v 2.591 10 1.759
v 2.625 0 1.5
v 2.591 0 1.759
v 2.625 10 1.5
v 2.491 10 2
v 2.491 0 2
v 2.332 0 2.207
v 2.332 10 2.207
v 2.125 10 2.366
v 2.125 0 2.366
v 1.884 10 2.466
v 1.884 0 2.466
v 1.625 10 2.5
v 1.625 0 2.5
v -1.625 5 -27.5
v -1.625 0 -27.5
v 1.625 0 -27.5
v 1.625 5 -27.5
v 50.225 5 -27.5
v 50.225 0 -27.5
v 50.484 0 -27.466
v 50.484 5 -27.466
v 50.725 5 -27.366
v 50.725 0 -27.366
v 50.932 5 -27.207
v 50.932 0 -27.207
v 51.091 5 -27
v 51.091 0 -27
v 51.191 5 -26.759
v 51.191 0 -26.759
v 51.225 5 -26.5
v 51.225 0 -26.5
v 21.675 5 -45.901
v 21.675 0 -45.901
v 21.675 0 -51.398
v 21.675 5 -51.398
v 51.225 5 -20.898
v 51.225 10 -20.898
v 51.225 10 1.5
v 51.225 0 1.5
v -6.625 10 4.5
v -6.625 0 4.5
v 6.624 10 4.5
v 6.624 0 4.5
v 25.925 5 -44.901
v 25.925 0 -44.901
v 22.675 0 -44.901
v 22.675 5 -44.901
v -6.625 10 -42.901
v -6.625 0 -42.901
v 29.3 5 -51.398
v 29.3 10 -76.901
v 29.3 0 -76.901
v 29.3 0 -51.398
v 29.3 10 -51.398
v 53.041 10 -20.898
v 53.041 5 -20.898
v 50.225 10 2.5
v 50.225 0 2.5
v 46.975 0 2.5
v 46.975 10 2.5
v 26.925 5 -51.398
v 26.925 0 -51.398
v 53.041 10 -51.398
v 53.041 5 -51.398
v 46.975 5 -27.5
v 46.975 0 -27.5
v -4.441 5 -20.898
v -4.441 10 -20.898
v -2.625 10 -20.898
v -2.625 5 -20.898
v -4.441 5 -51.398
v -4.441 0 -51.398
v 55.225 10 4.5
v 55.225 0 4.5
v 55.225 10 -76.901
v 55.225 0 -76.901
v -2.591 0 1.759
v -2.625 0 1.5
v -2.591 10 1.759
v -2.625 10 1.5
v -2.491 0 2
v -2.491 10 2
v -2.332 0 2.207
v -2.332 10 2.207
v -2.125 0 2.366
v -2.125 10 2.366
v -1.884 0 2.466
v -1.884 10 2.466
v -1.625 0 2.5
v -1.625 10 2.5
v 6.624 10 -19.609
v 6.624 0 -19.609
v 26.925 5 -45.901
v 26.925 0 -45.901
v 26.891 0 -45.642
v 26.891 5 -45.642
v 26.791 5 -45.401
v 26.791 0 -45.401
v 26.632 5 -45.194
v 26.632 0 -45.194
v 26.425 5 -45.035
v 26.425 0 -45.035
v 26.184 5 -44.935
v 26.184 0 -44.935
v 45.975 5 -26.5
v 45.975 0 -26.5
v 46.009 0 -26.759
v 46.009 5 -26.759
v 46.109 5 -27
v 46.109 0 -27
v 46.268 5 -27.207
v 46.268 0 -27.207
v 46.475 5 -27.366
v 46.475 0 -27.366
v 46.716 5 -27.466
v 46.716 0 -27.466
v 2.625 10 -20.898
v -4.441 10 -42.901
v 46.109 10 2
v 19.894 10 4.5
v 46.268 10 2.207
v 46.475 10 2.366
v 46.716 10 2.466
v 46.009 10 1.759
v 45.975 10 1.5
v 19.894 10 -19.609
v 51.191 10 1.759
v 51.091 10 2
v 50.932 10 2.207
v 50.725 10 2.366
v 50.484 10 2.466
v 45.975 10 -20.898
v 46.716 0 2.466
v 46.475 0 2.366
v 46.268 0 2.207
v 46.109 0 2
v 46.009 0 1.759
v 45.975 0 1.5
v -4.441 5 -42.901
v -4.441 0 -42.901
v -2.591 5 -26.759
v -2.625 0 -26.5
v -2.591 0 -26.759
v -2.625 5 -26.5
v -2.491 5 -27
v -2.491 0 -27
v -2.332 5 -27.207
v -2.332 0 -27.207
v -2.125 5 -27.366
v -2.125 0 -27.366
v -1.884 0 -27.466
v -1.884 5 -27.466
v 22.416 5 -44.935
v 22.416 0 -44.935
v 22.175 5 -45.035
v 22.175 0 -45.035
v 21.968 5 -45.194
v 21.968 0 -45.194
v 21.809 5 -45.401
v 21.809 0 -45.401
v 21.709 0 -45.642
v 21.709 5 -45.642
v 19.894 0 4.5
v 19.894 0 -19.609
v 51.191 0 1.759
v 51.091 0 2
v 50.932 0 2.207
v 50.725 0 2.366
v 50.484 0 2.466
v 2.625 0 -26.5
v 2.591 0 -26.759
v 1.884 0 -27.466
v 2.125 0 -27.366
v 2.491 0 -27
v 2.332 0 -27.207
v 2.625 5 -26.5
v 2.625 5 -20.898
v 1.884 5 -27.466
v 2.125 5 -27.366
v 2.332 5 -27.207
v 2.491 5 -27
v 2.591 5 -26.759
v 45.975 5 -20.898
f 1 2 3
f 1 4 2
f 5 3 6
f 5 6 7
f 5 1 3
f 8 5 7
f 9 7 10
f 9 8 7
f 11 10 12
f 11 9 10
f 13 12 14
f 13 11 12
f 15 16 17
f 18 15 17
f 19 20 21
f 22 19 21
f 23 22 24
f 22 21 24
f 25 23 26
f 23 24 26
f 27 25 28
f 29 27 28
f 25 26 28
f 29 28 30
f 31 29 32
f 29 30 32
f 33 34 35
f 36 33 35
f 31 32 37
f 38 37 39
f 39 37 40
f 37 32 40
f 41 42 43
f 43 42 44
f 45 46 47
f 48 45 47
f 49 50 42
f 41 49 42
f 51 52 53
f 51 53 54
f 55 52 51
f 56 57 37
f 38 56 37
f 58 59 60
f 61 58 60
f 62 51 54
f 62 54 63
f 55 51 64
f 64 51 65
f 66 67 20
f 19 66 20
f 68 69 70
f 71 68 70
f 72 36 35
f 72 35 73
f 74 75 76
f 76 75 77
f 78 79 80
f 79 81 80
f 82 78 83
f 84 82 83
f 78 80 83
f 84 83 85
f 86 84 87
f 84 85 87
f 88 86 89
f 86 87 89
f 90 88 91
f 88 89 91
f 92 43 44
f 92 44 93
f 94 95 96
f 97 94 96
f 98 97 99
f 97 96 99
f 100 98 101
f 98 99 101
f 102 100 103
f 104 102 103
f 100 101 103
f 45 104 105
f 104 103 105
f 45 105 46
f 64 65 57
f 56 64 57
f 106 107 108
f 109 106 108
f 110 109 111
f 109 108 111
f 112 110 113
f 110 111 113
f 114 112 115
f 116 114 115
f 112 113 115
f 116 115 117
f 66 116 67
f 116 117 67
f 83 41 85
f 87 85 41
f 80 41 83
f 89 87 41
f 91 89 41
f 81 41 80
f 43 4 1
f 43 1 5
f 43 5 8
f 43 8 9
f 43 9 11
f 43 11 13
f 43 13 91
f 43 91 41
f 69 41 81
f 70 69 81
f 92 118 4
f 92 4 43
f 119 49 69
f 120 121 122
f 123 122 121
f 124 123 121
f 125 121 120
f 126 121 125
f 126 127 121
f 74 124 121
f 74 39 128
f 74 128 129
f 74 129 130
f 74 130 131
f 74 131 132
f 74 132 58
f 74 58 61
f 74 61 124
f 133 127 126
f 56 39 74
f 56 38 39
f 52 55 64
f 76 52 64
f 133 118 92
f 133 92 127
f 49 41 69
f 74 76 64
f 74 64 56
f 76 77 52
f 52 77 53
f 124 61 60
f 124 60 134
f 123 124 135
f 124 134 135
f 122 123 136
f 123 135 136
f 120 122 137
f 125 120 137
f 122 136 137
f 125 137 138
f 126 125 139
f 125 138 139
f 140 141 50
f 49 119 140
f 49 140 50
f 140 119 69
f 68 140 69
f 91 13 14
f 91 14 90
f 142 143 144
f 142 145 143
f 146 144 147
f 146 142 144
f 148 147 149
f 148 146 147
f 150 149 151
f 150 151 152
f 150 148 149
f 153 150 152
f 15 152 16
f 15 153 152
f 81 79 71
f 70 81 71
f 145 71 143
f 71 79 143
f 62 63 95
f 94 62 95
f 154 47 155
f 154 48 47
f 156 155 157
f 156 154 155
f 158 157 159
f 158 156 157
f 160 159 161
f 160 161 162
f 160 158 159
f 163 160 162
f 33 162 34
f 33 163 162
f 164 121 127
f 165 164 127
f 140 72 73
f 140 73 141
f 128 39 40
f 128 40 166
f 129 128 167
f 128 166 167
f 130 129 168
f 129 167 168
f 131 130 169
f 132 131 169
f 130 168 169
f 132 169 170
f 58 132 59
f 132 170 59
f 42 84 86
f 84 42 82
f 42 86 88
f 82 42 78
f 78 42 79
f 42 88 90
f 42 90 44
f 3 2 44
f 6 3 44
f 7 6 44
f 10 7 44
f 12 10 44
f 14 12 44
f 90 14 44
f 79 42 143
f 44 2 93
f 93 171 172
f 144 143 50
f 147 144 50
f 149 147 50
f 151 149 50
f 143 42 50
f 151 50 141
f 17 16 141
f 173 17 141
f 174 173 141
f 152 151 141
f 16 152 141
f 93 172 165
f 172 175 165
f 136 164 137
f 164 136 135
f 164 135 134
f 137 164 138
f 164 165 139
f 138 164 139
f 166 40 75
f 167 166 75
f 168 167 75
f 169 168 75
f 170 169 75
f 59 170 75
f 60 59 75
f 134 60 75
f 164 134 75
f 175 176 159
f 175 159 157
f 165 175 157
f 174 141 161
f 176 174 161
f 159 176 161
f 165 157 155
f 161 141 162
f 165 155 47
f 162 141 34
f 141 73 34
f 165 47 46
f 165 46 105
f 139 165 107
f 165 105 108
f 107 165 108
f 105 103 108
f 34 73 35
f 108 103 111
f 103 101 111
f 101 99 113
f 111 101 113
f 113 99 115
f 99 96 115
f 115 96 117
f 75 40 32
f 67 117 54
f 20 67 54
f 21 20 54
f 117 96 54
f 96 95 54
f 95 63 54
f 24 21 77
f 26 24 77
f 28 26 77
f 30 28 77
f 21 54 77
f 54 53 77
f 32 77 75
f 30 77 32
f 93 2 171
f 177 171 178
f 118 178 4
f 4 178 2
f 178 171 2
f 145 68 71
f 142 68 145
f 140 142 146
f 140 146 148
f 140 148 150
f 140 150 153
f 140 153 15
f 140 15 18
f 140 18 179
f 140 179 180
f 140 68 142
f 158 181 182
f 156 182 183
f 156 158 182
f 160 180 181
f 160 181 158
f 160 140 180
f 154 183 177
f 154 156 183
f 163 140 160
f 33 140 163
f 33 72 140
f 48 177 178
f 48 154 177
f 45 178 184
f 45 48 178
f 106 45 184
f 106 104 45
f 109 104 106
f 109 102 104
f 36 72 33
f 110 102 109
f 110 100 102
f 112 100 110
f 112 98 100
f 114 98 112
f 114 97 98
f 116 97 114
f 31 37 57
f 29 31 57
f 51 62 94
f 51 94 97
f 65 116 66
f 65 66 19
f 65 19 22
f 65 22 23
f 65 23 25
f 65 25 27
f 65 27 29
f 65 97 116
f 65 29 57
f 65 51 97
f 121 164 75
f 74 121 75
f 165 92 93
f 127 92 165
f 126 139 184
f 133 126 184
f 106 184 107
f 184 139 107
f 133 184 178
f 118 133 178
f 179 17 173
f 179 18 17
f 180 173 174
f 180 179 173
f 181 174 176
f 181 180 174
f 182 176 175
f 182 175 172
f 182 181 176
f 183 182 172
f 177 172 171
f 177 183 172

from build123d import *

# Parameters (mm, degrees)
BOSS_EXTRUDE5_DEPTH = 10
CUT_EXTRUDE6_DEPTH  = 5
FILLET4_R           = 1
MIRROR25_DEPTH      = 10
MIRROR25_2_DEPTH    = 5
SKETCH20_W          = 13.27
SKETCH20_H          = 33.288518674
CUT_EXTRUDE7_DEPTH  = 10


# Read off the part's stored shape, not the designer's step: Mirror25
with BuildPart() as part:
    # Sketch15 → Boss-Extrude5 (new body)
    with BuildSketch(Plane(origin=(0, 0, 0), x_dir=(1, 0, 0), z_dir=(0, 1, 0))):
        Polygon((24.3, 76.900659127), (-6.625, 76.900659127), (-6.625, -4.5), (24.3, -4.5), (24.3, 44.900659127), (21.675, 44.900659127), (21.675, 47.400659127), (21.675, 72.400659127), (21.675, 74.900659127), (24.3, 74.900659127), align=None)
        Polygon((-2.625, 25), (-2.625, 0), (-2.625, -2.5), (0, -2.5), (2.625, -2.5), (2.625, 0), (2.625, 25), (2.625, 27.5), (0, 27.5), (-2.625, 27.5), align=None, mode=Mode.SUBTRACT)
    extrude(amount=BOSS_EXTRUDE5_DEPTH)

    # Sketch18 → Cut-Extrude6 (cut)
    with BuildSketch(Plane(origin=(0, 10, 0), x_dir=(1, 0, 0), z_dir=(0, 1, 0))):
        Polygon((21.675, 51.3980649), (-4.44053483, 51.3980649), (-4.44053483, 20.8980649), (24.3, 20.8980649), (24.3, 51.3980649), align=None)
    extrude(amount=-CUT_EXTRUDE6_DEPTH, mode=Mode.SUBTRACT)

    # Fillet4
    fillet4_edges = [part.edges().sort_by_distance(p)[0] for p in [
        (21.675, 5, -74.900659127),
        (-2.625, 5, 2.5),
        (2.625, 5, 2.5),
        (2.625, 2.5, -27.5),
        (-2.625, 2.5, -27.5),
        (21.675, 2.5, -44.900659127),
    ]]
    fillet(fillet4_edges, radius=FILLET4_R)

    # Mirror25 outline → Mirror25 (add)
    with BuildSketch(Plane(origin=(0, 0, 0), x_dir=(1, 0, 0), z_dir=(0, 1, 0))):
        with BuildLine():
            Line((45.975, 20.8980649), (24.3, 20.8980649))
            Line((24.3, 20.8980649), (24.3, -4.5))
            Line((24.3, -4.5), (55.225, -4.5))
            Line((55.225, -4.5), (55.225, 76.900659127))
            Line((55.225, 76.900659127), (24.3, 76.900659127))
            Line((24.3, 76.900659127), (24.3, 74.900659127))
            Line((24.3, 74.900659127), (25.925, 74.900659127))
            ThreePointArc((25.925, 74.900659127), (26.632106781, 74.607765908), (26.925, 73.900659127))
            Line((26.925, 73.900659127), (26.925, 51.3980649))
            Line((26.925, 51.3980649), (53.04053483, 51.3980649))
            Line((53.04053483, 51.3980649), (53.04053483, 20.8980649))
            Line((53.04053483, 20.8980649), (51.225, 20.8980649))
            Line((51.225, 20.8980649), (51.225, -1.5))
            ThreePointArc((51.225, -1.5), (50.932106781, -2.207106781), (50.225, -2.5))
            Line((50.225, -2.5), (46.975, -2.5))
            ThreePointArc((46.975, -2.5), (46.267893219, -2.207106781), (45.975, -1.5))
            Line((45.975, -1.5), (45.975, 20.8980649))
        make_face()
    extrude(amount=MIRROR25_DEPTH)

    # Mirror25 2 outline → Mirror25 2 (add)
    with BuildSketch(Plane(origin=(0, 0, 0), x_dir=(1, 0, 0), z_dir=(0, 1, 0))):
        with BuildLine():
            Line((25.925, 44.900659127), (24.3, 44.900659127))
            Line((24.3, 44.900659127), (24.3, 20.8980649))
            Line((24.3, 20.8980649), (45.975, 20.8980649))
            Line((45.975, 20.8980649), (45.975, 26.5))
            ThreePointArc((45.975, 26.5), (46.267893219, 27.207106781), (46.975, 27.5))
            Line((46.975, 27.5), (50.225, 27.5))
            ThreePointArc((50.225, 27.5), (50.932106781, 27.207106781), (51.225, 26.5))
            Line((51.225, 26.5), (51.225, 20.8980649))
            Line((51.225, 20.8980649), (53.04053483, 20.8980649))
            Line((53.04053483, 20.8980649), (53.04053483, 51.3980649))
            Line((53.04053483, 51.3980649), (26.925, 51.3980649))
            Line((26.925, 51.3980649), (26.925, 45.900659127))
            ThreePointArc((26.925, 45.900659127), (26.632106781, 45.193552346), (25.925, 44.900659127))
        make_face()
    extrude(amount=MIRROR25_2_DEPTH)

    # Sketch20 → Cut-Extrude7 (cut)
    with BuildSketch(Plane(origin=(0, 10, 0), x_dir=(1, 0, 0), z_dir=(0, 1, 0))):
        with Locations((13.258799085, 2.964933045)):
            Rectangle(SKETCH20_W, SKETCH20_H)
        Polygon((-6.625, 76.900659127), (14.49053483, 76.900659127), (14.49053483, 89.151488298), (21.675, 89.151488298), (26.925, 89.151488298), (29.3, 89.151488298), (29.3, 51.3980649), (26.925, 51.3980649), (26.925, 61.088659891), (21.675, 61.088659891), (21.675, 51.3980649), (-4.44053483, 51.3980649), (-4.44053483, 42.900659127), (-6.625, 42.900659127), (-6.625, 56.002594228), align=None)
    extrude(amount=-CUT_EXTRUDE7_DEPTH, mode=Mode.SUBTRACT)


solid = part.part
